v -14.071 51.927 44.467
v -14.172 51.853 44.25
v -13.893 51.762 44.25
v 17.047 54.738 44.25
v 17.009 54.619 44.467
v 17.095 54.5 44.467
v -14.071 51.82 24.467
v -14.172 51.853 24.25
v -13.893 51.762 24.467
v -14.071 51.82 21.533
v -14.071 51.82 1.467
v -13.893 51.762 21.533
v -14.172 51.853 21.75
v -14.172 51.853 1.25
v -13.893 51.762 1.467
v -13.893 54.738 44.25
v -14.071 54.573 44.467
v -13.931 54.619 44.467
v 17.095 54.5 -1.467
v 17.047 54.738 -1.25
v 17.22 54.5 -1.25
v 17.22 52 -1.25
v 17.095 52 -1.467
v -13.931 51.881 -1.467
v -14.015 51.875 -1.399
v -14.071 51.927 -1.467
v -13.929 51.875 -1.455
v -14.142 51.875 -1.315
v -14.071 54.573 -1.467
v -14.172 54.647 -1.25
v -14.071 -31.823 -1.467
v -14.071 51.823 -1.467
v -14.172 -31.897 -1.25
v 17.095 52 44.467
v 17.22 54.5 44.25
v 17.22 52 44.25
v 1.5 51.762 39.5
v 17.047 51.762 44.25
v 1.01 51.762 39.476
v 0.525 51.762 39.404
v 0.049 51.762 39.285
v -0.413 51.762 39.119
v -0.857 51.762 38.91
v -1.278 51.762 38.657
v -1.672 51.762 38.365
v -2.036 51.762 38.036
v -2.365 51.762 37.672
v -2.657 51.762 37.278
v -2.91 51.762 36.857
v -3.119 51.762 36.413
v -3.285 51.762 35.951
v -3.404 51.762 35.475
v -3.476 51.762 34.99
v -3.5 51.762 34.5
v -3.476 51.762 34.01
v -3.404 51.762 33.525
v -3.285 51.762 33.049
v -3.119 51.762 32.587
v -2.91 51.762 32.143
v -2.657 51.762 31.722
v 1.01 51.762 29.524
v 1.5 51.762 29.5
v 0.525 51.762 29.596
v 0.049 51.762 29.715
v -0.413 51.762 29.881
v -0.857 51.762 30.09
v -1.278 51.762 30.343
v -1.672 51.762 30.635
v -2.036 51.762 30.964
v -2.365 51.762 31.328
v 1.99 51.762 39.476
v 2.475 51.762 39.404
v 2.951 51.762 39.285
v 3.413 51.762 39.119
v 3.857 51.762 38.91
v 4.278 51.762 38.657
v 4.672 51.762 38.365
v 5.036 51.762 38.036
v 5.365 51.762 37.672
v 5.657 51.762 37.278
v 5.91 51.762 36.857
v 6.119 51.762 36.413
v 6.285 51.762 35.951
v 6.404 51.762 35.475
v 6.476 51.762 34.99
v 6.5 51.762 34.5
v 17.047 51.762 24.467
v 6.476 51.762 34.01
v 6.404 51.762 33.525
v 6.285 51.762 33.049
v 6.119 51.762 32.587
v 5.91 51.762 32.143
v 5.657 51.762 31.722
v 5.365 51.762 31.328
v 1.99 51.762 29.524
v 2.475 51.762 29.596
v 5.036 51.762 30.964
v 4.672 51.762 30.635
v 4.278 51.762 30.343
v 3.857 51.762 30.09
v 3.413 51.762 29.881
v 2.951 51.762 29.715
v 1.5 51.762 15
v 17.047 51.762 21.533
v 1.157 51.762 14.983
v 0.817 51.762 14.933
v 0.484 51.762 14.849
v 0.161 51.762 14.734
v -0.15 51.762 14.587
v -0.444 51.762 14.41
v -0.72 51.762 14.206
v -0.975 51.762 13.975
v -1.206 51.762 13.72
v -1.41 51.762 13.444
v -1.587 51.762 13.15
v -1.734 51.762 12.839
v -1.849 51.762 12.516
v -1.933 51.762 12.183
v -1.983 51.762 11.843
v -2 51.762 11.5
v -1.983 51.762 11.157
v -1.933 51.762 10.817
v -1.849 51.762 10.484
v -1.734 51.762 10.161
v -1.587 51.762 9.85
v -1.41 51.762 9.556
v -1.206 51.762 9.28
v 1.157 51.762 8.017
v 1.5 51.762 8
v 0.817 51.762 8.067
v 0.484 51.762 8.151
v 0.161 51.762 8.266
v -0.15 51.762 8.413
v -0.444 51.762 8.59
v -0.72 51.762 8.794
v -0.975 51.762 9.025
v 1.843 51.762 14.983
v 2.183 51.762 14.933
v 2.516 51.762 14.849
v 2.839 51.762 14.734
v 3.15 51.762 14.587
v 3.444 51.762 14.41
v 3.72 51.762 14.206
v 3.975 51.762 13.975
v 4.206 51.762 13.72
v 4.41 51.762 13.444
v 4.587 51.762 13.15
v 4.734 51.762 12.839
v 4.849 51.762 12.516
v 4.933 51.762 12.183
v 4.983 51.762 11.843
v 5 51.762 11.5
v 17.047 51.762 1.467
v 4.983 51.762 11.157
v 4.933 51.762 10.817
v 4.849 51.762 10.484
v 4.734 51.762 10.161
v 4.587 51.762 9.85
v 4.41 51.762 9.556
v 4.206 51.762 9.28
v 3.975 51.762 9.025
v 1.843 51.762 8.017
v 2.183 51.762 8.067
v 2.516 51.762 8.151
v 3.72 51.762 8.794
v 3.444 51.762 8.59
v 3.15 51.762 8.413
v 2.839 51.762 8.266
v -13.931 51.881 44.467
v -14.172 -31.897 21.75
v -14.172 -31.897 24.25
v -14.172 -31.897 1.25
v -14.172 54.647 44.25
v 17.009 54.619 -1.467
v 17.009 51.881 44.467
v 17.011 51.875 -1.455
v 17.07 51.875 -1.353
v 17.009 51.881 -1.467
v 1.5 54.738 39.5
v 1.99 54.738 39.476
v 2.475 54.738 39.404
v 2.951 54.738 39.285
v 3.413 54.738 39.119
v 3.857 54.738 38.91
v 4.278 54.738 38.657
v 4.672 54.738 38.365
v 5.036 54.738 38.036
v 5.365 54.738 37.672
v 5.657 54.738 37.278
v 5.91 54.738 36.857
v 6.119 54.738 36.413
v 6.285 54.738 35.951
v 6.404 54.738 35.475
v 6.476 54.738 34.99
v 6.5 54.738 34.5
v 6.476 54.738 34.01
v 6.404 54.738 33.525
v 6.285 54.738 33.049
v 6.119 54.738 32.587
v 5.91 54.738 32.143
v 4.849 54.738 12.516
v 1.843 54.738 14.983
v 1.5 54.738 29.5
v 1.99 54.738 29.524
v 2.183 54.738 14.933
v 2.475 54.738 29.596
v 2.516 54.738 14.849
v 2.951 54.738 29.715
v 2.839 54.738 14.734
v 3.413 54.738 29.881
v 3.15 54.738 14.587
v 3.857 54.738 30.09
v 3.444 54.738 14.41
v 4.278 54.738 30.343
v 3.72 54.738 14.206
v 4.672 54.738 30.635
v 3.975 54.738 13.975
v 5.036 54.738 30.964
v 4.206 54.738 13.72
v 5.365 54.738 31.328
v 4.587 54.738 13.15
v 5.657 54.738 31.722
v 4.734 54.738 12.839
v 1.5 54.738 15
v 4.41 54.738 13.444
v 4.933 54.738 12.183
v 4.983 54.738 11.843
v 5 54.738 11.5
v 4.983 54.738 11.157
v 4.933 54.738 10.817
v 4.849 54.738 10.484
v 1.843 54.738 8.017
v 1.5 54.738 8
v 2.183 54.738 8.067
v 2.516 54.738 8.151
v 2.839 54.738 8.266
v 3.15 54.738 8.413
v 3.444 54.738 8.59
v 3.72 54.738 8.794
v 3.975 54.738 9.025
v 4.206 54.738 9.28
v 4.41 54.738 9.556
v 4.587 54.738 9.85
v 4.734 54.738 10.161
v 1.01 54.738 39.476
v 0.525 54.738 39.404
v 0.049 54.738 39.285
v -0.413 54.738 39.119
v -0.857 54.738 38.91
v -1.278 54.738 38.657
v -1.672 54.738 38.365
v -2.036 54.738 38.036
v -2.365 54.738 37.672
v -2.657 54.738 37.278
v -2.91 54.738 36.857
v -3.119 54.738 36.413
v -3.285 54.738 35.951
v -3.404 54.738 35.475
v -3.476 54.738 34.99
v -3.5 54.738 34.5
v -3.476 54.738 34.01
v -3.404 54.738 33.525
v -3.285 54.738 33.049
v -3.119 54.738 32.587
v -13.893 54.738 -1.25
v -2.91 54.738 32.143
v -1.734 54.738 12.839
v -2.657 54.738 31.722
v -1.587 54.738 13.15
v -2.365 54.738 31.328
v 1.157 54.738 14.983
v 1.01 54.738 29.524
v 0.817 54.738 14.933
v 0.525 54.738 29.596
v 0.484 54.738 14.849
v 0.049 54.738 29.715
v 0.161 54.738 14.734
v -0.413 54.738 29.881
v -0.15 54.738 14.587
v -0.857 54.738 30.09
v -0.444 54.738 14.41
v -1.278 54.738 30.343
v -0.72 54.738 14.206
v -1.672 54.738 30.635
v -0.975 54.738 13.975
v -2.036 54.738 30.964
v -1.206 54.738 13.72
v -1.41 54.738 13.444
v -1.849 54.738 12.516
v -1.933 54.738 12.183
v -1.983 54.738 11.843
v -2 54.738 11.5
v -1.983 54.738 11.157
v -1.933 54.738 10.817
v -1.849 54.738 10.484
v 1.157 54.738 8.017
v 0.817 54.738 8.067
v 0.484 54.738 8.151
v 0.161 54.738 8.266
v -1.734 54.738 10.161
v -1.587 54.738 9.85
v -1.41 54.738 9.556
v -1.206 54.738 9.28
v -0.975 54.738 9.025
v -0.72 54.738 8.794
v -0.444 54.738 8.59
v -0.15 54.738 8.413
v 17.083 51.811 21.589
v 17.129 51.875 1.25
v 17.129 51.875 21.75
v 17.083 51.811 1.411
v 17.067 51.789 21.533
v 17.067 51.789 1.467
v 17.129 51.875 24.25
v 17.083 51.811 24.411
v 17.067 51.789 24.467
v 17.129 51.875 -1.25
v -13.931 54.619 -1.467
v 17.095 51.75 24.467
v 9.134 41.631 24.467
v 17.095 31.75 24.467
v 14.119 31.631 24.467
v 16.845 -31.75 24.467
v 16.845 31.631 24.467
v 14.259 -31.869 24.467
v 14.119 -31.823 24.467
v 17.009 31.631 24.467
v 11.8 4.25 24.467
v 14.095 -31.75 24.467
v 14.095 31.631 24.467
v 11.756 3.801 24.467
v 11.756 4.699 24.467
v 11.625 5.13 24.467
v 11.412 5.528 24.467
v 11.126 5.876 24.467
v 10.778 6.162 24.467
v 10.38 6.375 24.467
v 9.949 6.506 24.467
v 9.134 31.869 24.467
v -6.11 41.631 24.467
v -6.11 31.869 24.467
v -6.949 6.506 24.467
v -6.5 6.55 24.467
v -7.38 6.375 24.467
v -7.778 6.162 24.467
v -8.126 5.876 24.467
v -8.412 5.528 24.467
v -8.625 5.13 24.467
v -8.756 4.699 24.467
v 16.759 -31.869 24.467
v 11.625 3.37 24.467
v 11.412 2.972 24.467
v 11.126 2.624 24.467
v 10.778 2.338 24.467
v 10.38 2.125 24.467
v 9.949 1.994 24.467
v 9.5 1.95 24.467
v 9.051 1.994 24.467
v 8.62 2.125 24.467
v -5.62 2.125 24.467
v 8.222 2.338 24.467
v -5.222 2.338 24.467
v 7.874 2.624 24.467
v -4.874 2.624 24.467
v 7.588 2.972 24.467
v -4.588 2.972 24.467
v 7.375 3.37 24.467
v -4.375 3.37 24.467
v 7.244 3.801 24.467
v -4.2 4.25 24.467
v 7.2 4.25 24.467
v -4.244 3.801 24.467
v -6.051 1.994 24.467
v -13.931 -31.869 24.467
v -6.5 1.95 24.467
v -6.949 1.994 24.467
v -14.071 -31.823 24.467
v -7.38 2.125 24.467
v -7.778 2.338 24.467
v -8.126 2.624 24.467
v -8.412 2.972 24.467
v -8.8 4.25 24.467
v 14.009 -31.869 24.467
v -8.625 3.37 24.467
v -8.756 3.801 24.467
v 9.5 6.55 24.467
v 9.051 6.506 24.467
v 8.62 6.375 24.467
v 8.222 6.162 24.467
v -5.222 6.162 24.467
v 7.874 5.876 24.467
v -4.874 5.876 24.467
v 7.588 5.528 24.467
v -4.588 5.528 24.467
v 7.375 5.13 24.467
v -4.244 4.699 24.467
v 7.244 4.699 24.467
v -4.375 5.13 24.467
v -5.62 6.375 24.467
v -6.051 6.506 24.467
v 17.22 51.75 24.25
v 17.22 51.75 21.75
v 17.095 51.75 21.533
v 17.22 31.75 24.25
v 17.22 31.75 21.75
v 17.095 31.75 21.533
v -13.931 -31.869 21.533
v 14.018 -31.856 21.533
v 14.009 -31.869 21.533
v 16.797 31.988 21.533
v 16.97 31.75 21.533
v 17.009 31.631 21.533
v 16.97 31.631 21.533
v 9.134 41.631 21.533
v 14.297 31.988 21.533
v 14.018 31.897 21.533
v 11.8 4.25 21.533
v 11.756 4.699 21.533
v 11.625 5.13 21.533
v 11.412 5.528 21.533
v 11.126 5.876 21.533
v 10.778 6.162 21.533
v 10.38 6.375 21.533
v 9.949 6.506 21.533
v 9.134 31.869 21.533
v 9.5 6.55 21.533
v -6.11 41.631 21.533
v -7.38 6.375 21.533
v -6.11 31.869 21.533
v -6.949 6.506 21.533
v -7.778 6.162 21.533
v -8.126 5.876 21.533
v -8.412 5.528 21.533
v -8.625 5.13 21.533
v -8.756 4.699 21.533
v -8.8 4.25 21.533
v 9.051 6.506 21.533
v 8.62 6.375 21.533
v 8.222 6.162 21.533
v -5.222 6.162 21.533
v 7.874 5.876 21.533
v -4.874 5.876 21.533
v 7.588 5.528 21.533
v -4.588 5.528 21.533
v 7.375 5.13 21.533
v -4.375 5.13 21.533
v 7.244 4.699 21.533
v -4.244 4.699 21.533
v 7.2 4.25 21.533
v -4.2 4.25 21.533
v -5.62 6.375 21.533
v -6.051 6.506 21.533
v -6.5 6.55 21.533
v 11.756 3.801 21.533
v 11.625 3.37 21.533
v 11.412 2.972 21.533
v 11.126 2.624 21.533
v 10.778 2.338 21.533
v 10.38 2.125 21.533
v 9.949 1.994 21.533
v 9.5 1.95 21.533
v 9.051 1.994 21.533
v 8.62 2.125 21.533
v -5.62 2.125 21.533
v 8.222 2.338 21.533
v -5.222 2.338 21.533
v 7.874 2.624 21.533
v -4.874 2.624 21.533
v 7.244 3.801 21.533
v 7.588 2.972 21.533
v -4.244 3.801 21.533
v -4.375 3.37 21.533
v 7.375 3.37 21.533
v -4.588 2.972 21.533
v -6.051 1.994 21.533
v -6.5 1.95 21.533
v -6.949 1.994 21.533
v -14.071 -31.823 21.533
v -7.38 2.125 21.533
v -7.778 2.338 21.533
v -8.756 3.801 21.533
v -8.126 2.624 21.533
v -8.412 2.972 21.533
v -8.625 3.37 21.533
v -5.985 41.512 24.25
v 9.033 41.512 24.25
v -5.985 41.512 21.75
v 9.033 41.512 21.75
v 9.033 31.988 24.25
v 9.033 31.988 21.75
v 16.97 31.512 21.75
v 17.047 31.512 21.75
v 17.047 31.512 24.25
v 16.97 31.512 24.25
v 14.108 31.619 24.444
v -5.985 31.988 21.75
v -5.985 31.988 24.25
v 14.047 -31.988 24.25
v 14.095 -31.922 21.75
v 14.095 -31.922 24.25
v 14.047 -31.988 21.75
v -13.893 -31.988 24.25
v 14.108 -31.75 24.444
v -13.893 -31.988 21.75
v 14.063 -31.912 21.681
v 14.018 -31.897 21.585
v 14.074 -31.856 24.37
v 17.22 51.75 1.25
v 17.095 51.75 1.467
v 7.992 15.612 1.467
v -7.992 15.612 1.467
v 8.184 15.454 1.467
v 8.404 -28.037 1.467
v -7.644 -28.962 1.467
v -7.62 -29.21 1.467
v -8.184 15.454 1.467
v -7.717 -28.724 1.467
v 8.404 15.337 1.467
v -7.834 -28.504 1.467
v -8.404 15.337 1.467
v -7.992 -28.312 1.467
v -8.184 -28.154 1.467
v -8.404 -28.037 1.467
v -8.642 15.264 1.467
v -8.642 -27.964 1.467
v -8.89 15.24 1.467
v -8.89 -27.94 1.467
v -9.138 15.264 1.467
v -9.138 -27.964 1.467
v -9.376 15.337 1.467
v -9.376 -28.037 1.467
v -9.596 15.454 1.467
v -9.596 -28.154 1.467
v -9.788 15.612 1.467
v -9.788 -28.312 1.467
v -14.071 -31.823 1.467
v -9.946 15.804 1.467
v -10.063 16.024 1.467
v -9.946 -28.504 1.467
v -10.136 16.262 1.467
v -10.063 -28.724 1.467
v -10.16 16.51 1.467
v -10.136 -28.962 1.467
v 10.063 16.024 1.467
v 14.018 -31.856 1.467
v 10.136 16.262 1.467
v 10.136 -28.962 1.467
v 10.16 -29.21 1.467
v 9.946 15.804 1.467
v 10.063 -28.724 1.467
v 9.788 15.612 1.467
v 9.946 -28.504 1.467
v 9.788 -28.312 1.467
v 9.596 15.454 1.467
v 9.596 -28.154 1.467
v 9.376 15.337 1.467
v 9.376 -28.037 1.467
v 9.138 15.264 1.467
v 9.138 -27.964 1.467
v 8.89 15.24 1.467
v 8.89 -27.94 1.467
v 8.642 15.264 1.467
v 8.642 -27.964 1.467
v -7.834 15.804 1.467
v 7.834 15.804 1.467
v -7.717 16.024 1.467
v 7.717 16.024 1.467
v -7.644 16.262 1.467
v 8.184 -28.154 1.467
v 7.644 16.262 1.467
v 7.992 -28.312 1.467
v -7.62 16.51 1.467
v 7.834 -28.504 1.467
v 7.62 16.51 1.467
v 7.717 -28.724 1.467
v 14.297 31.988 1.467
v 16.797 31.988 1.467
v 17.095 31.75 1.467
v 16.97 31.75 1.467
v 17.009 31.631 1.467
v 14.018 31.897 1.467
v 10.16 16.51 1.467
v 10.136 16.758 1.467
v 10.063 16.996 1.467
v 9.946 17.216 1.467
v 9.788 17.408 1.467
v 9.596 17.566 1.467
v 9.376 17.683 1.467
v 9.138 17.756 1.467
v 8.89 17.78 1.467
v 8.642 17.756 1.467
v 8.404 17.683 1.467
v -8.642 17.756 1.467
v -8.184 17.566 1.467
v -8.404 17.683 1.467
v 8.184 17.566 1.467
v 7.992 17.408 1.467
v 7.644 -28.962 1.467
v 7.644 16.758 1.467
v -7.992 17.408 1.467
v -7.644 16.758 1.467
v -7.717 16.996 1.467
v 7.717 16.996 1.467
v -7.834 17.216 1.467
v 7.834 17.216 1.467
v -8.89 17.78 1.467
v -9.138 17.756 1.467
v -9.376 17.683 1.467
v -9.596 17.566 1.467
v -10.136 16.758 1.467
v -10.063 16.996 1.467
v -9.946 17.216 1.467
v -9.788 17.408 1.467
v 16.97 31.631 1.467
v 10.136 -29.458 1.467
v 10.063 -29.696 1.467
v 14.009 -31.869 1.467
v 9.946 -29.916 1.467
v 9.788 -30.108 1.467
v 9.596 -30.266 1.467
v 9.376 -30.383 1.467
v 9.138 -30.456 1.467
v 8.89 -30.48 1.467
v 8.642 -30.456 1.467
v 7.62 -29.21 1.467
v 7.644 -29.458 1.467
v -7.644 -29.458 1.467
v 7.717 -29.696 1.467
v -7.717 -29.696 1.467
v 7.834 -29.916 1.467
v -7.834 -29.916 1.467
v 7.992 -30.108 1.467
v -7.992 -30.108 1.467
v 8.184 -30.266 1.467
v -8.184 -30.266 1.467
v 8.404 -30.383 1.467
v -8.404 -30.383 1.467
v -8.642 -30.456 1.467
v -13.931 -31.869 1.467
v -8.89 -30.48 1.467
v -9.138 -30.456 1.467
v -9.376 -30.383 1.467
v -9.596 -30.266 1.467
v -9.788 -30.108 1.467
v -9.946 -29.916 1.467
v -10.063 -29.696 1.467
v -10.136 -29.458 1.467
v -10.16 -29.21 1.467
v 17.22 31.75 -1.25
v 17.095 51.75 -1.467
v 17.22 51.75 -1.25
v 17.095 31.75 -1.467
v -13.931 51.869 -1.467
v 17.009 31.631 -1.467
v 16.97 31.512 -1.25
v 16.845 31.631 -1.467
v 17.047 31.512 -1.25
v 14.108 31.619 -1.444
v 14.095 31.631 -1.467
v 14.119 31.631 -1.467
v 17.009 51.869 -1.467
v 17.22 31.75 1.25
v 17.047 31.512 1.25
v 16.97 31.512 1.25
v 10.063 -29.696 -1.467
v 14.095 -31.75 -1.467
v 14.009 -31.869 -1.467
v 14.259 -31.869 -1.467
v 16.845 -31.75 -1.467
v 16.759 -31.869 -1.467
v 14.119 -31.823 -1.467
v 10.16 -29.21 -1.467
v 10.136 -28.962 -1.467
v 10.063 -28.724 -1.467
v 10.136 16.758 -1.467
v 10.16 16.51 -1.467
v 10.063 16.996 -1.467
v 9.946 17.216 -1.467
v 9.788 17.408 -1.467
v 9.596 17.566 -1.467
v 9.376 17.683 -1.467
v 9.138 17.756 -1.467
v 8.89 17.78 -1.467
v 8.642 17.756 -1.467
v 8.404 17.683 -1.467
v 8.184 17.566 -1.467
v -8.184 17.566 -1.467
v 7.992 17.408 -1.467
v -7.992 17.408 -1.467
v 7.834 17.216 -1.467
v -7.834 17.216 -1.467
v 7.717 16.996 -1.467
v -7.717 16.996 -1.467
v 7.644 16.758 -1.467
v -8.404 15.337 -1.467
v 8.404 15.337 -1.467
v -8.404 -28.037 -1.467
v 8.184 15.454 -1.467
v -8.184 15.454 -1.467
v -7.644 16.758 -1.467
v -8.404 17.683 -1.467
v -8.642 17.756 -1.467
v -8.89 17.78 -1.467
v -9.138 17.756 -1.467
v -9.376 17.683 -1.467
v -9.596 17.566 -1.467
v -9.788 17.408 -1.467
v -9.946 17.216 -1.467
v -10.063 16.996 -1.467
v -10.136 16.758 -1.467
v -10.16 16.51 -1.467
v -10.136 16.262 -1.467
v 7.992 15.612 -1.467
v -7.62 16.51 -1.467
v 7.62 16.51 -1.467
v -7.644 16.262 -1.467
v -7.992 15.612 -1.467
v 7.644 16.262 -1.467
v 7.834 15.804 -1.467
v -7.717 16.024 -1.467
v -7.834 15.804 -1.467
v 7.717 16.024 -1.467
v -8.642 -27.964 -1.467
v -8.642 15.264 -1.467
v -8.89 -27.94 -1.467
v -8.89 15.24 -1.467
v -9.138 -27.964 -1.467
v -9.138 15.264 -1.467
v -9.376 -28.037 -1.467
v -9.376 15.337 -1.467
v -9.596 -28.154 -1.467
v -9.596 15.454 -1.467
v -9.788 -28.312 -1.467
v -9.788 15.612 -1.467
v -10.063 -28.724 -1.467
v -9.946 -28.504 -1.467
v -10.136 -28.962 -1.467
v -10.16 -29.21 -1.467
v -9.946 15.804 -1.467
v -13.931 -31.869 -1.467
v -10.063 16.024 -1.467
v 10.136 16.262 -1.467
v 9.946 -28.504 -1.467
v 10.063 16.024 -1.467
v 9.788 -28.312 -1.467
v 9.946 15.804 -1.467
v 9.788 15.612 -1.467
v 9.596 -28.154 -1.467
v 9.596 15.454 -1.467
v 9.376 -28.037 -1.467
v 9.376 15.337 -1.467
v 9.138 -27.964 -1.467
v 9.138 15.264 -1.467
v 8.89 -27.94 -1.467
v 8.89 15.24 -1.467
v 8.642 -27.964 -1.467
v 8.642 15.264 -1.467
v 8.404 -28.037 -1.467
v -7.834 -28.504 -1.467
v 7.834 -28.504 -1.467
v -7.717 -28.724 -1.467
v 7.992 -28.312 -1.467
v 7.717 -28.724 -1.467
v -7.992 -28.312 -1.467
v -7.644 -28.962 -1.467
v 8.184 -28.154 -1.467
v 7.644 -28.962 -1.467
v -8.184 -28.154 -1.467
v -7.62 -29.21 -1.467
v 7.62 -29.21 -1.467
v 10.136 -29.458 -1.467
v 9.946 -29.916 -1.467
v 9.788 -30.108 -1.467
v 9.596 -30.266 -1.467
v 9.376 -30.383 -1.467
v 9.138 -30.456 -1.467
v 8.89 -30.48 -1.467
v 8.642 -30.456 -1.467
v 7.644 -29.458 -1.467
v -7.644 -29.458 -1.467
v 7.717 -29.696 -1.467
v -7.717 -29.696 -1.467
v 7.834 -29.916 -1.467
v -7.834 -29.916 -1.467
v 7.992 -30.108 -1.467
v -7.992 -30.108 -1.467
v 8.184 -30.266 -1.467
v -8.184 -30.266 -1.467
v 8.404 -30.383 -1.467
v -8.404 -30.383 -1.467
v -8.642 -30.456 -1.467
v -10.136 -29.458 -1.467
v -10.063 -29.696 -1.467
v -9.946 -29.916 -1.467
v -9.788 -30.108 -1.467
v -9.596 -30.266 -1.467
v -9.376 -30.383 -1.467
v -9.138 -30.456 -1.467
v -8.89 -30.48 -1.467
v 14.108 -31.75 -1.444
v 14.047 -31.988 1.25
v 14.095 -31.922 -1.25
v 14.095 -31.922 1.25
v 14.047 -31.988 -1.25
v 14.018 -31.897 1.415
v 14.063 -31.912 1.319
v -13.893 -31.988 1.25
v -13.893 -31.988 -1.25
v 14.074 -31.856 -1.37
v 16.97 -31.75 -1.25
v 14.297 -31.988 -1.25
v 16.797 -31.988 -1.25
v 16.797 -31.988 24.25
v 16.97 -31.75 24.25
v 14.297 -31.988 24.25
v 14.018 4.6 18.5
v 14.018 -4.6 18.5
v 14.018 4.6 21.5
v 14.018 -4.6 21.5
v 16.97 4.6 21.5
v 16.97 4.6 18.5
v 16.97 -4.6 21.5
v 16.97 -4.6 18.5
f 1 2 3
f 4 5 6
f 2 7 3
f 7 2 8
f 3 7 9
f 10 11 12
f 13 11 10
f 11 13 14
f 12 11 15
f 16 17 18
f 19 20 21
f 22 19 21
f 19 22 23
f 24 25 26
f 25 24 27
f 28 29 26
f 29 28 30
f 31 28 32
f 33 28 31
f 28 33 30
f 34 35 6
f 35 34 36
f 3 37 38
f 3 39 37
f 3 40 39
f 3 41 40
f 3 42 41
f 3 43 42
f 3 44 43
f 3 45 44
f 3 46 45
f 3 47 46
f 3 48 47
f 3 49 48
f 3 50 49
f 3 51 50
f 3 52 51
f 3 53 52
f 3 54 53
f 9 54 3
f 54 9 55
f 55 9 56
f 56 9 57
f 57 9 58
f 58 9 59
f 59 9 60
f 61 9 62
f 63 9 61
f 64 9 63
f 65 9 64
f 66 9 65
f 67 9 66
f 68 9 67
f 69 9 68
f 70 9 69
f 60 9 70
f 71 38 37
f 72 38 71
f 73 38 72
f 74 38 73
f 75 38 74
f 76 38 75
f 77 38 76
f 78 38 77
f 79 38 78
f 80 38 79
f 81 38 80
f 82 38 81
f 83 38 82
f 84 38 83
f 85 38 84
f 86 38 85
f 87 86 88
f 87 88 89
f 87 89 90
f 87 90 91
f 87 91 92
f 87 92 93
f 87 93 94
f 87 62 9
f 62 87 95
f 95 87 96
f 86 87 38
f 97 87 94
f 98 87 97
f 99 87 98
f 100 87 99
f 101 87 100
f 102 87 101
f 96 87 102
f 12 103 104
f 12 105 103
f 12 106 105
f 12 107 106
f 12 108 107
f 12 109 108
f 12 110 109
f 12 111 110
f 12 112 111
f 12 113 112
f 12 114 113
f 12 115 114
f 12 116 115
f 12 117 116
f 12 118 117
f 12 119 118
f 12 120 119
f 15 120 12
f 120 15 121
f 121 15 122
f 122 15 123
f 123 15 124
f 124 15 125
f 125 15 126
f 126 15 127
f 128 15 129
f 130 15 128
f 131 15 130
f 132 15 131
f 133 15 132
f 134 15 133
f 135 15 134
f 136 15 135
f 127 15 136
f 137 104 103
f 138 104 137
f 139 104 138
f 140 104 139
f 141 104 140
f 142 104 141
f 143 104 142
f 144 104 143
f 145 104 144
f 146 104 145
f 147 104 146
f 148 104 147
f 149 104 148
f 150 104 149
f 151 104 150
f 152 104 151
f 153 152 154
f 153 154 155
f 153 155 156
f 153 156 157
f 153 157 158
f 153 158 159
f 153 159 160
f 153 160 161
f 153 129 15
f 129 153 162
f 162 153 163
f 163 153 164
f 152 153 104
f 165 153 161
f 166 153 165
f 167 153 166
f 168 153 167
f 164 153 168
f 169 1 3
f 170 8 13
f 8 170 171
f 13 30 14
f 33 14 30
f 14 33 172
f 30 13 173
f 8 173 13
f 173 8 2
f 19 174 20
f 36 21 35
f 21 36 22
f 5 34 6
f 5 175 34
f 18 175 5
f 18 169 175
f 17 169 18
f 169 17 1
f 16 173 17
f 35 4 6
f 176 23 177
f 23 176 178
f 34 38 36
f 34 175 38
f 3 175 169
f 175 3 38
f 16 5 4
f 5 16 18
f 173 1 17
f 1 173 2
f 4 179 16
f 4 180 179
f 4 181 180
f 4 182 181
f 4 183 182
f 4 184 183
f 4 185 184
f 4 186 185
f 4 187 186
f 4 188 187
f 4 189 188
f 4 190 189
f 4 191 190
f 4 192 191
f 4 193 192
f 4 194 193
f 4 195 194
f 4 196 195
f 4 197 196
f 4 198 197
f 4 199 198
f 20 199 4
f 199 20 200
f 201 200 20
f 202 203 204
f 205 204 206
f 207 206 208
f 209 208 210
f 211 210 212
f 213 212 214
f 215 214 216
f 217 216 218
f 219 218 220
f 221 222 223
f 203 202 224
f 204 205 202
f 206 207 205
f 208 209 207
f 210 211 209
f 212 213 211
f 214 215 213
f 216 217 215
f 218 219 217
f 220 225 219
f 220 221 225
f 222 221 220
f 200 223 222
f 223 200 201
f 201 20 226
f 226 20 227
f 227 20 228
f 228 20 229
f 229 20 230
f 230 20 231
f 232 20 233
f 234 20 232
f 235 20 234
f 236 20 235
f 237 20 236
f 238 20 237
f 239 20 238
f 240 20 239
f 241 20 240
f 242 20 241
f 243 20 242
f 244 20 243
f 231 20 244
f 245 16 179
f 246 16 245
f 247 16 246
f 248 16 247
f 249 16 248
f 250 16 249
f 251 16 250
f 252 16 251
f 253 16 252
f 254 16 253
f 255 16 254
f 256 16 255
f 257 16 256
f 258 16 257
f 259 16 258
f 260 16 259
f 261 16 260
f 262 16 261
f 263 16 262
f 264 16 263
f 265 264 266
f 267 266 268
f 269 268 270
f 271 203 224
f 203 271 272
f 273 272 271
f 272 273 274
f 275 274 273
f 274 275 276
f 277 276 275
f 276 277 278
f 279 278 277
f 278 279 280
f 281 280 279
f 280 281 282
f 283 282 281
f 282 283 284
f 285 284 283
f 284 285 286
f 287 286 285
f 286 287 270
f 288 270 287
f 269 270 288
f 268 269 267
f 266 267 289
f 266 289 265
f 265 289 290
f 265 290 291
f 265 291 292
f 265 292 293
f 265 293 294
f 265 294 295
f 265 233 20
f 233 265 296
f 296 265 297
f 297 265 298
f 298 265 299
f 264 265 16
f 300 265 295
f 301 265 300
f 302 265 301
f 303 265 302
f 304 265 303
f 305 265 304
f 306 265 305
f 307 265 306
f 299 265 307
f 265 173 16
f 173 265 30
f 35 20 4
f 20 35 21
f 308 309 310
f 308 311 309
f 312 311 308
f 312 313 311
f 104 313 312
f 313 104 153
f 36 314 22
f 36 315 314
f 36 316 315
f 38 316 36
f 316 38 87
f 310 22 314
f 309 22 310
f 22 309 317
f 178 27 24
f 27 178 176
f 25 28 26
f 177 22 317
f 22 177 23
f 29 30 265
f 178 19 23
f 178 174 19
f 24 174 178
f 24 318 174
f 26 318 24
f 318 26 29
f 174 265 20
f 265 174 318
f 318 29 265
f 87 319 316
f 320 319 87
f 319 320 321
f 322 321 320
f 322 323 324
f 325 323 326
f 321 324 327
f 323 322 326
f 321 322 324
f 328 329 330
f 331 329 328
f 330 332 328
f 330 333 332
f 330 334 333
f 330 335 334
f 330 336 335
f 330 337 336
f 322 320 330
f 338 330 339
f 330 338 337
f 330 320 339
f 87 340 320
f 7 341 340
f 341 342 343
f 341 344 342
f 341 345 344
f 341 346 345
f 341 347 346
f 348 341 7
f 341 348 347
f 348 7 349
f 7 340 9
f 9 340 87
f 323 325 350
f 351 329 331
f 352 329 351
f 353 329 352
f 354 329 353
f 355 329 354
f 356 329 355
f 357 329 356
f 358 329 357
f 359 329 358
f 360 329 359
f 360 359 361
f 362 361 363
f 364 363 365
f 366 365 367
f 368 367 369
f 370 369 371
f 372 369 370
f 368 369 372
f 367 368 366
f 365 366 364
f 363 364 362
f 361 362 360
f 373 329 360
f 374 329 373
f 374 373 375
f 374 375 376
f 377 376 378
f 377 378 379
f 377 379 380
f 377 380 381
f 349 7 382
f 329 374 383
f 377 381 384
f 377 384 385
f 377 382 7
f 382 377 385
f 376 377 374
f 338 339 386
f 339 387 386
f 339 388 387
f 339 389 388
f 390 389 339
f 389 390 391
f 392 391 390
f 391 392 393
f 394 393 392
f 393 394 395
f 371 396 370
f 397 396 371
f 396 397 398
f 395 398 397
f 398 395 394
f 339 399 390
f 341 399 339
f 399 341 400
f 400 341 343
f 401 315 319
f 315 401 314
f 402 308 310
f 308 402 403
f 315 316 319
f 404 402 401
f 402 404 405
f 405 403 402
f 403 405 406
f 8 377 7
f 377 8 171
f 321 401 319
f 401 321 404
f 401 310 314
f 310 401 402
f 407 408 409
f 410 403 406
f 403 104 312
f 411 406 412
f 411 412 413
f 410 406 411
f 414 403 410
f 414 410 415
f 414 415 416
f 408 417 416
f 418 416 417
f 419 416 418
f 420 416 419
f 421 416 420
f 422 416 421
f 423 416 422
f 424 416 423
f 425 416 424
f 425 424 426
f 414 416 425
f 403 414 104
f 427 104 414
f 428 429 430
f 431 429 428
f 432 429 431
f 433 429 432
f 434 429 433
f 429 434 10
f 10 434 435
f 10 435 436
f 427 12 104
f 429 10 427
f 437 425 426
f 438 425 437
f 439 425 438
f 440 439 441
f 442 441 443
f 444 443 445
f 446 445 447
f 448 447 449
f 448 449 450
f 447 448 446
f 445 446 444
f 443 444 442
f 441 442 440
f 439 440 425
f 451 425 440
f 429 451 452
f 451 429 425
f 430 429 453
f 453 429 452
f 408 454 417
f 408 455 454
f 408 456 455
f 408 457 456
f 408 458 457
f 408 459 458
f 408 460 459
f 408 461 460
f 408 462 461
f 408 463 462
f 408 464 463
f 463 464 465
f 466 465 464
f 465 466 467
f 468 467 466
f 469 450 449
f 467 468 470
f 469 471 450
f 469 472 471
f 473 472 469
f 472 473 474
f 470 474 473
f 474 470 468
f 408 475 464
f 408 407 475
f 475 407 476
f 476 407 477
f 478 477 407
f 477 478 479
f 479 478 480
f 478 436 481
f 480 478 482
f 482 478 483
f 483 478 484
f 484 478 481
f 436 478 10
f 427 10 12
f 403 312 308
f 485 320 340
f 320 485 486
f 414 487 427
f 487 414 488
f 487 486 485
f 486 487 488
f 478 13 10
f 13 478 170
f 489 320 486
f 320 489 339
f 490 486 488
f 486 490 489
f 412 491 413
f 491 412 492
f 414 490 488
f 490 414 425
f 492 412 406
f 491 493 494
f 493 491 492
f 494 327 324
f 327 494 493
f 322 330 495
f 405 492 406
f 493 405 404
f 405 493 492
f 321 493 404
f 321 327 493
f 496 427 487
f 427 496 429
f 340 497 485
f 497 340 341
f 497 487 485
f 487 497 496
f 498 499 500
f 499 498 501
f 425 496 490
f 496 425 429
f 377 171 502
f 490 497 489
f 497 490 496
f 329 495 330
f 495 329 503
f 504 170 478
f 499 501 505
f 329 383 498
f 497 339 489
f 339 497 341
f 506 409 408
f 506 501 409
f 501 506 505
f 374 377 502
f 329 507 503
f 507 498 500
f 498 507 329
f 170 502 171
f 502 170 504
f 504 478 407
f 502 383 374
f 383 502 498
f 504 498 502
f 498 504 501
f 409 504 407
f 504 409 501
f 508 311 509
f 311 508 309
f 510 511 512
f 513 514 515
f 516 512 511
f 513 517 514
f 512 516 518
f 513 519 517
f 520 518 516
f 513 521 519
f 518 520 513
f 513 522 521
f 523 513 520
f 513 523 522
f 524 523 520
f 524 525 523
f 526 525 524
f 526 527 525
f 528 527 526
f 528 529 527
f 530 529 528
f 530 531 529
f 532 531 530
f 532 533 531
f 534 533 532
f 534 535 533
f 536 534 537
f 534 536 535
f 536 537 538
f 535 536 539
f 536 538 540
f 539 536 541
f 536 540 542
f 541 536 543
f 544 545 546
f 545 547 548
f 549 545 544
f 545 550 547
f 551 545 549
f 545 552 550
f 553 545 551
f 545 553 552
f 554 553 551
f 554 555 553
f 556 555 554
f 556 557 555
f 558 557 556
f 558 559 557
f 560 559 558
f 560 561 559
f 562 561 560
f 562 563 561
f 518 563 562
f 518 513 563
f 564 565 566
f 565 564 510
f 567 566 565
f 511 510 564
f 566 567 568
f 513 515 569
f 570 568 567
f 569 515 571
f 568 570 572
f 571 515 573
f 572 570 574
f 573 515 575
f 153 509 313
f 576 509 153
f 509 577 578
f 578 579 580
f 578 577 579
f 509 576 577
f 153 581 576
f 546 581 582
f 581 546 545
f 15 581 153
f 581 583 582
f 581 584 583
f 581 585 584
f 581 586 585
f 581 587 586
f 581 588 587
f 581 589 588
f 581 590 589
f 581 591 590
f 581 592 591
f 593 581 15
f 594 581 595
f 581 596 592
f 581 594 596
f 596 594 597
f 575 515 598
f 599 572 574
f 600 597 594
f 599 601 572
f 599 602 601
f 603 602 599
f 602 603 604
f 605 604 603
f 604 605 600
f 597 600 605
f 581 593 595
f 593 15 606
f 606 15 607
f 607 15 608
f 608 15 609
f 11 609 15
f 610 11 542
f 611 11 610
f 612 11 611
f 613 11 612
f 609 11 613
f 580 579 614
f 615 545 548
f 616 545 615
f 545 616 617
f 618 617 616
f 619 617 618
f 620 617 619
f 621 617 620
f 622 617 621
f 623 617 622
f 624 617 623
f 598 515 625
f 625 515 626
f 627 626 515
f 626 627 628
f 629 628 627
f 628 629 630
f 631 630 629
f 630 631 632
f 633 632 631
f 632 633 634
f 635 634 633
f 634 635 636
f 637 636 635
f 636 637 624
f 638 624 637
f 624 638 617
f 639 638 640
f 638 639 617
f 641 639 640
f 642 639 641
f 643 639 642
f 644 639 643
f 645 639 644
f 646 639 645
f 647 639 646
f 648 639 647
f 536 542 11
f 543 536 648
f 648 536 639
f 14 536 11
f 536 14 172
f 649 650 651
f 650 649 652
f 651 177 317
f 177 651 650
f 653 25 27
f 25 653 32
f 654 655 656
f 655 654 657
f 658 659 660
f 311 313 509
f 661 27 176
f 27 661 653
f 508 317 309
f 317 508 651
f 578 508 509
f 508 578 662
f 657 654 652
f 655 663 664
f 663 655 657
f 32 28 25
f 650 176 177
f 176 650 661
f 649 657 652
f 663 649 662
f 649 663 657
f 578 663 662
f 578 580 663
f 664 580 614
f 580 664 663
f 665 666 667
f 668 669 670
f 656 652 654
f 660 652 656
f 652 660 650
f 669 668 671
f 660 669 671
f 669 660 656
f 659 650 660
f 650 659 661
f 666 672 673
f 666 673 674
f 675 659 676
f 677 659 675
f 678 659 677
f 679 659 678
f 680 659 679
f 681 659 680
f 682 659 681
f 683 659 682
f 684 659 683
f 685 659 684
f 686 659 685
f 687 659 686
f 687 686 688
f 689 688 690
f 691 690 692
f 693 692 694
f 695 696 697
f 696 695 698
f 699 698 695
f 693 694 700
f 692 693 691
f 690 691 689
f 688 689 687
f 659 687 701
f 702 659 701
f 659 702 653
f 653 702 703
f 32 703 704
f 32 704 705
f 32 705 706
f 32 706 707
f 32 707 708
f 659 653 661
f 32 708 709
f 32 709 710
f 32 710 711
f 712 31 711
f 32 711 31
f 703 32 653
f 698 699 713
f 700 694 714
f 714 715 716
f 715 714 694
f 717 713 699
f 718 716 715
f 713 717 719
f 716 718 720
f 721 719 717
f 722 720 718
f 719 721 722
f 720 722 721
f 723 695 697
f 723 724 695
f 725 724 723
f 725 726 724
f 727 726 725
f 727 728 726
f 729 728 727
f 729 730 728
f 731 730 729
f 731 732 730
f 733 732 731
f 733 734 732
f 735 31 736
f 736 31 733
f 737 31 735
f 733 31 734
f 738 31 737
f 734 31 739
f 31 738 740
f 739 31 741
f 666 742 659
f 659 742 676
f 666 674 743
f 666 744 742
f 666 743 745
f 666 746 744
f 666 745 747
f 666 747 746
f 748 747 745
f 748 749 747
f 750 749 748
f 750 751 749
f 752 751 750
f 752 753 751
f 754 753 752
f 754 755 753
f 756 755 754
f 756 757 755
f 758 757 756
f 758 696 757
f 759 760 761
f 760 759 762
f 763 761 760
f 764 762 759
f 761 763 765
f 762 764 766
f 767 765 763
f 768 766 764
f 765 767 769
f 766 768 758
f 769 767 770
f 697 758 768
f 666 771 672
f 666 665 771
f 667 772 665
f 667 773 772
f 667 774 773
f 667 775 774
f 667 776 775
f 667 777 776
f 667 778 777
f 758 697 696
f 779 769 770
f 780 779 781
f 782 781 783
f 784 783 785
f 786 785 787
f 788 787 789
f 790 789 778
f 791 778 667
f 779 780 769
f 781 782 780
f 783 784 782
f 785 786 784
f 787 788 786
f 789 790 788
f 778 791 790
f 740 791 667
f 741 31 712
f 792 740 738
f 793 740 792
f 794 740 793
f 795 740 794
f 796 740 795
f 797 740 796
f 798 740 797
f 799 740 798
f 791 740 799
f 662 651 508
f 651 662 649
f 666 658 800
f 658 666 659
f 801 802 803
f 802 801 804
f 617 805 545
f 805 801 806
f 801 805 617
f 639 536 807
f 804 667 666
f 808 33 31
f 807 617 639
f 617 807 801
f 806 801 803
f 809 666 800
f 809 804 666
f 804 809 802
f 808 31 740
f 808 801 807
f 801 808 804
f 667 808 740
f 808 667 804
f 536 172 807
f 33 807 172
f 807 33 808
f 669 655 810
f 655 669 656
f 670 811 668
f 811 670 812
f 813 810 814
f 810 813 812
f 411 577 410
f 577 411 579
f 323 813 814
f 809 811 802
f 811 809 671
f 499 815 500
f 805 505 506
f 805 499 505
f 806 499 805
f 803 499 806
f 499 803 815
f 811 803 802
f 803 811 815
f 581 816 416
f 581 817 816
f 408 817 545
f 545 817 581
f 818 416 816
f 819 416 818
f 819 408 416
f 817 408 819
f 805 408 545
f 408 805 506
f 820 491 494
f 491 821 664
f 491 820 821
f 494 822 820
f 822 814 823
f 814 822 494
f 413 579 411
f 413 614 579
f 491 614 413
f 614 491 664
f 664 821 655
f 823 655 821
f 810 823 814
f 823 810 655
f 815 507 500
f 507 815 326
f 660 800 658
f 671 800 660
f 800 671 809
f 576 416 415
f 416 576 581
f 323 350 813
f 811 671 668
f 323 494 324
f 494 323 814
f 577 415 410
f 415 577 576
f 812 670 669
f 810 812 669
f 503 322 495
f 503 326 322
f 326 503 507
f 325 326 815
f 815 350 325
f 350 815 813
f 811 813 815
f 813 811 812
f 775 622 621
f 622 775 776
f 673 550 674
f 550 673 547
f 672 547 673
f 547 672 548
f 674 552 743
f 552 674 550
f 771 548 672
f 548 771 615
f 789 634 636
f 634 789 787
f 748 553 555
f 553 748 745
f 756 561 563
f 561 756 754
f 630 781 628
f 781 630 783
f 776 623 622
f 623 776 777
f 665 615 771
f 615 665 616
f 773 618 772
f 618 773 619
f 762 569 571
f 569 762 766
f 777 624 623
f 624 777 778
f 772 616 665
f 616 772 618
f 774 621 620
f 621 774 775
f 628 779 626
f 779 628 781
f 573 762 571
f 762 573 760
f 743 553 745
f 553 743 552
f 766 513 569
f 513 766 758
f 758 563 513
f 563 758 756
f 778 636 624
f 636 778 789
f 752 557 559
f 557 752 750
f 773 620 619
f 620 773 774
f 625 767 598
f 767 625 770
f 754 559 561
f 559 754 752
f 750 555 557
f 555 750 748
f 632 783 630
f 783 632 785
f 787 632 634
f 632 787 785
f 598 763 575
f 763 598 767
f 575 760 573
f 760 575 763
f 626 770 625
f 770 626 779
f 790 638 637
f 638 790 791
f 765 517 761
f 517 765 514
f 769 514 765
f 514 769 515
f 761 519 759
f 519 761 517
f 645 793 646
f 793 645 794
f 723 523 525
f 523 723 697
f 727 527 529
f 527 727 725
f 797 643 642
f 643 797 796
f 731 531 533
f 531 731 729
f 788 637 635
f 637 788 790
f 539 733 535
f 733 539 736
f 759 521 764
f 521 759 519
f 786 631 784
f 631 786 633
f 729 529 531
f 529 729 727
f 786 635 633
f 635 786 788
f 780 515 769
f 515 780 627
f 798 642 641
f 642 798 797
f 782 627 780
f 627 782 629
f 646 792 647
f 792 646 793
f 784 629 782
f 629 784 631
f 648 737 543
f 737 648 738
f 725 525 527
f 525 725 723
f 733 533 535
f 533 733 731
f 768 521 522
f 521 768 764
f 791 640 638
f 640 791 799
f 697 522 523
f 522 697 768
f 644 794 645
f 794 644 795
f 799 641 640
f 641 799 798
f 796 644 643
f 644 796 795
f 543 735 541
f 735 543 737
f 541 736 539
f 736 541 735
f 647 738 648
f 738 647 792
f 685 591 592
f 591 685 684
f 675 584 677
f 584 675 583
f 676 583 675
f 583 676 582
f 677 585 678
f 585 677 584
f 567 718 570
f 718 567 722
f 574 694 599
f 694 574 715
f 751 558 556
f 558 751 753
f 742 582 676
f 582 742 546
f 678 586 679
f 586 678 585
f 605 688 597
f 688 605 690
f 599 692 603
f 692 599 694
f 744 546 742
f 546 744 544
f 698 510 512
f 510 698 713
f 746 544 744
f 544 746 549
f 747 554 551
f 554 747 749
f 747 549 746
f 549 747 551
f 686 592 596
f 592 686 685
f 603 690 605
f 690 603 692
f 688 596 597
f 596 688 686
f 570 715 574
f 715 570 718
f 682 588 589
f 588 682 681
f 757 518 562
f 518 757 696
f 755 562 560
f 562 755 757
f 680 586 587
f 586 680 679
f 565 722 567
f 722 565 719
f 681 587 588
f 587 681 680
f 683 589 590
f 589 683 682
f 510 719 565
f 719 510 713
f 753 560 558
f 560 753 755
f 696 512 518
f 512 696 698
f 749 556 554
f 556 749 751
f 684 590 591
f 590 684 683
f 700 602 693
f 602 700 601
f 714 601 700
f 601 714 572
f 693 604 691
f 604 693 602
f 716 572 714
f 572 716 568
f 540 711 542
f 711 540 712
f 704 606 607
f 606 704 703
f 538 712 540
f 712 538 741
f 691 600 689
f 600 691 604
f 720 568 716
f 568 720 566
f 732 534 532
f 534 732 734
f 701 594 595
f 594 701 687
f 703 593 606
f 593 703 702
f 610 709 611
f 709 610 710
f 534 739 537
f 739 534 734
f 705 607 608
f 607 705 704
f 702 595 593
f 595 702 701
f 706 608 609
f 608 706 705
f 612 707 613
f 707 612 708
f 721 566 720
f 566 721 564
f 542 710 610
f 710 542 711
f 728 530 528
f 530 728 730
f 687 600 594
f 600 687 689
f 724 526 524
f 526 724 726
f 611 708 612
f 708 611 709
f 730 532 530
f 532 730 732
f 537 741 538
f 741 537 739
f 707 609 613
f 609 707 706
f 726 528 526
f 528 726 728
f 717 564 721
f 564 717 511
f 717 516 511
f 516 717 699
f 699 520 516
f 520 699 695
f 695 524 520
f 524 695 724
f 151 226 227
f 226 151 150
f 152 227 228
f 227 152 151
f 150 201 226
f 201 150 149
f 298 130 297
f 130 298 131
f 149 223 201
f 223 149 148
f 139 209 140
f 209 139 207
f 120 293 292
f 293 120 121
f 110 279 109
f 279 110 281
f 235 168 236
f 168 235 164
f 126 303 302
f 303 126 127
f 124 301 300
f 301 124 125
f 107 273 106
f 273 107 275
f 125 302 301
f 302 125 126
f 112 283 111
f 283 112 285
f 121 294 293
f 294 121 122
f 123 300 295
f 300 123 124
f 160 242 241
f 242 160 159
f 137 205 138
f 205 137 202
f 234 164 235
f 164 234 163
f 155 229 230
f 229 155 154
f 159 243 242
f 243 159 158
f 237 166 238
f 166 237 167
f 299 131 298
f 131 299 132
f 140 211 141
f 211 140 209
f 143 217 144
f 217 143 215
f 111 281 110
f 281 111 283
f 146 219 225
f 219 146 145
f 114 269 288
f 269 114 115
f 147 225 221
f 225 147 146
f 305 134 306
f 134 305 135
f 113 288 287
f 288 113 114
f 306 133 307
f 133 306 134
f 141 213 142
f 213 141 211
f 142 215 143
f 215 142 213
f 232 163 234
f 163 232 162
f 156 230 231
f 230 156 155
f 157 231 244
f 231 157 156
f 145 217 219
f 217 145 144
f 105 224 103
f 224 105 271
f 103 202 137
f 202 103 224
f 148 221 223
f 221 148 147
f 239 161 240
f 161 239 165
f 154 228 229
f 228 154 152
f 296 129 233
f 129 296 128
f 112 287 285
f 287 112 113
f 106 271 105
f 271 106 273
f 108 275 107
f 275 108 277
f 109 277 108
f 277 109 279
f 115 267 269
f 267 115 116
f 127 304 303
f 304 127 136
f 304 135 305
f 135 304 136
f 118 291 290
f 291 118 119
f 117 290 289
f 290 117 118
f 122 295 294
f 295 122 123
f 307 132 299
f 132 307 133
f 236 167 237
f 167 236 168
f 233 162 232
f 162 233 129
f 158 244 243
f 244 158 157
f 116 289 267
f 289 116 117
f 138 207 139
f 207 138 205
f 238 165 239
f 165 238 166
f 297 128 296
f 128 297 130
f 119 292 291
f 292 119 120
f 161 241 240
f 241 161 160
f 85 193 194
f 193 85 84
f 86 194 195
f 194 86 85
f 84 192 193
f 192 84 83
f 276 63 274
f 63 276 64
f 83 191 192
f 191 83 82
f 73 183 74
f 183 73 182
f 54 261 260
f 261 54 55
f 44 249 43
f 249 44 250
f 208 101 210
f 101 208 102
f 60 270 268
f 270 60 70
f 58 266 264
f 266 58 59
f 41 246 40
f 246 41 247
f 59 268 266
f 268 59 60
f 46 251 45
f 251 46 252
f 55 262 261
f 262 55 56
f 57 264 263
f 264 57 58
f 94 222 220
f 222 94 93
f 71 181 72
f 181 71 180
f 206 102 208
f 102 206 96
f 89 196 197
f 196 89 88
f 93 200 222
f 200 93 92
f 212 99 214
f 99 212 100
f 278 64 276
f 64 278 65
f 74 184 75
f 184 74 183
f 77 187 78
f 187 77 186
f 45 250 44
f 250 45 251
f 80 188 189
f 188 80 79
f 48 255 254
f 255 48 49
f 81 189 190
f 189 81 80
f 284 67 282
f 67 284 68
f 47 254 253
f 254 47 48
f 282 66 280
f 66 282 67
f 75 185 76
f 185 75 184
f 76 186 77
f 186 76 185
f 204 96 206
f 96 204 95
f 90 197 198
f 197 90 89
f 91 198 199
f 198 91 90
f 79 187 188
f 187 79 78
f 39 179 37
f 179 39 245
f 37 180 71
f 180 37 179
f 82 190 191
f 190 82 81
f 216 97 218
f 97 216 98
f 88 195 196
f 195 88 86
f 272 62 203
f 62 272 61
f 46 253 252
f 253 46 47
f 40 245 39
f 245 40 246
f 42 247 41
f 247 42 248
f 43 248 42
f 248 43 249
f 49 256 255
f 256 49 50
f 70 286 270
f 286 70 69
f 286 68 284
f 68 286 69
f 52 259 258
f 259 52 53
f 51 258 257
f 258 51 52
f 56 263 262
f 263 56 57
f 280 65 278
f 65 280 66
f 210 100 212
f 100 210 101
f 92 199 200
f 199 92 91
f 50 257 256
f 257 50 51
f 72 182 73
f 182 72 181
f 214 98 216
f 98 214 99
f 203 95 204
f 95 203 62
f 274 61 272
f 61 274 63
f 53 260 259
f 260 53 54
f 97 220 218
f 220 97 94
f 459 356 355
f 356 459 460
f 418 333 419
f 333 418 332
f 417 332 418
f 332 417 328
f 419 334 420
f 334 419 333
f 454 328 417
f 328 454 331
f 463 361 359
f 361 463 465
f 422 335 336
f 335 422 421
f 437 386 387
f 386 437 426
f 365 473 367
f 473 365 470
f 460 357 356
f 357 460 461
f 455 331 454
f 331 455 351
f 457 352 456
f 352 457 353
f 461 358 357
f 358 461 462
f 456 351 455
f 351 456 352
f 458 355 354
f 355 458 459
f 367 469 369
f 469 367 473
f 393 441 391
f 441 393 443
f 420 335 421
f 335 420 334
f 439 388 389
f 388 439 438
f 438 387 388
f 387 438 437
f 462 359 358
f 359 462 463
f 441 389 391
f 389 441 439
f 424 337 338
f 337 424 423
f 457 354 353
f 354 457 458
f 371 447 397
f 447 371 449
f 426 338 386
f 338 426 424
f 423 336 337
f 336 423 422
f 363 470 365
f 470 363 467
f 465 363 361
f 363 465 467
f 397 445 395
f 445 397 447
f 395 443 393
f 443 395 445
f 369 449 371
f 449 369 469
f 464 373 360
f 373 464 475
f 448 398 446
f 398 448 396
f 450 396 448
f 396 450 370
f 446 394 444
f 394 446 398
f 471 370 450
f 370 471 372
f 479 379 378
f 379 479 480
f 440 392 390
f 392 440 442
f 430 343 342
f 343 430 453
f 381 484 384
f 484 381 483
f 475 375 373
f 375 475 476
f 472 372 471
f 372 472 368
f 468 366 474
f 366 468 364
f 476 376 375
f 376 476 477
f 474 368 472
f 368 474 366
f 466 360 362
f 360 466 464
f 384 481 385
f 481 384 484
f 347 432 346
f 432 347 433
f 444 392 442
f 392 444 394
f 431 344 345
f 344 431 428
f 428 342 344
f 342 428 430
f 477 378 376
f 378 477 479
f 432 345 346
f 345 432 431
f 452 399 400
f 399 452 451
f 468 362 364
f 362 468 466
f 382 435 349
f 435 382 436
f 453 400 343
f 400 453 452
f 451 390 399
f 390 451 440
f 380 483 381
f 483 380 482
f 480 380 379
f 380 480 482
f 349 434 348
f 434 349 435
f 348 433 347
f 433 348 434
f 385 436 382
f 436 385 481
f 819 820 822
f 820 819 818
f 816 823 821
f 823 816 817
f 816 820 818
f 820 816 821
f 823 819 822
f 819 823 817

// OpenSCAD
panelMargin = 0.1*25.4;
panelMarginX = 0.2*25.4;
panelWidth = 0.7*25.4 + panelMarginX*2;
panelHeight = 2.5*25.4;
panelThickness = 3;

deckHeight=20;

featherHoleLength = 1.8*25.4;
featherHoleWidth = 0.7*25.4;
featherRecessDiameter = 10;
screwAnchorThickness = 1;
featherRecessDepth = panelThickness - screwAnchorThickness;

controlWidth = panelWidth + panelThickness;
controlHeight= panelThickness + deckHeight + panelThickness + deckHeight;
controlDepth = 20;

dmxHoleWidth = 16;
dmxHoleDiameter = 4.6;
dmxHoleDepth = 36;

mechEncoderHoleDiameter = 7;
magnetEncoderHoleDiameter = 10;

roundingDiameter=0.5;

module steppedHole() {
    //translate([0, 0, (panelThickness - featherRecessDepth)/-2]) 
    //    cylinder(h=featherRecessDepth, d=0.16*25.4, center=true, $fn=32);
    cylinder(h=panelThickness, d=0.1*25.4, center=true, $fn=32);
}

difference() { // omg fixme
    minkowski() {
        union() {
            cube([panelWidth, panelHeight, panelThickness - roundingDiameter], center=true);
            translate([(panelWidth + panelThickness)/2, 0, (deckHeight + panelThickness)/2]) 
                cube([panelThickness - roundingDiameter, panelHeight, deckHeight + panelThickness* 2 - roundingDiameter], center=true);
            translate([0, 0, deckHeight + panelThickness]) 
                cube([panelWidth, panelHeight, panelThickness - roundingDiameter], center=true);
            translate([panelThickness/2, (panelHeight + controlDepth)/2, 0])
                cube([panelWidth + panelThickness, controlDepth, panelThickness - roundingDiameter], center=true);
            translate([panelThickness/2, (panelHeight + panelThickness)/2 + controlDepth, (controlHeight - panelThickness)/2])
                cube([panelWidth + panelThickness, panelThickness - roundingDiameter, controlHeight - roundingDiameter], center=true);
            difference() {
                translate([panelThickness/2, (panelHeight + controlDepth)/2, deckHeight + panelThickness])
                    cube([panelWidth + panelThickness, controlDepth, panelThickness - roundingDiameter], center=true);
                translate([panelThickness/2, (panelHeight + controlDepth/2)/2, deckHeight + panelThickness])
                    cube([(panelWidth + panelThickness)/2, controlDepth/2, panelThickness - roundingDiameter], center=true);
            }
        }
        sphere(d=roundingDiameter);
    }
    union() {
        translate([(panelWidth)/2 - panelMarginX, panelHeight/-2 + panelMargin, 0]) 
            steppedHole();
        translate([(panelWidth)/2 - featherHoleWidth - panelMarginX, panelHeight/-2 + panelMargin, 0]) 
            steppedHole();
        translate([(panelWidth)/2 - panelMarginX, panelHeight/-2 + featherHoleLength + panelMargin, 0]) 
            steppedHole();
        translate([(panelWidth)/2 - featherHoleWidth - panelMarginX, panelHeight/-2 + featherHoleLength + panelMargin, 0]) 
            steppedHole();
        translate([panelThickness/2, (panelHeight + panelThickness)/2 + controlDepth, (panelThickness + deckHeight)/2])
            rotate([90, 0, 0]) cylinder(d=mechEncoderHoleDiameter, h=panelThickness, center=true, $fn=64);
    }
        translate([panelThickness/2, (panelHeight + panelThickness)/2 + controlDepth, (panelThickness + deckHeight)/2 + panelThickness + deckHeight])
            rotate([90, 0, 0]) cylinder(d=magnetEncoderHoleDiameter, h=panelThickness, center=true, $fn=64);
        translate([(dmxHoleWidth+panelThickness)/2 , (panelHeight)/-2 + dmxHoleDepth, deckHeight + (panelThickness + panelThickness)/2])
            cylinder(d=dmxHoleDiameter, h=panelThickness, center=true, $fn=32);
        translate([(dmxHoleWidth-panelThickness)/-2, (panelHeight)/-2 + dmxHoleDepth, deckHeight + (panelThickness + panelThickness)/2])
            cylinder(d=dmxHoleDiameter, h=panelThickness, center=true, $fn=32);
        translate([(panelWidth+panelThickness)/2, 0, deckHeight])
            cube([panelThickness, dmxHoleDiameter*2, panelThickness], center=true);

}
